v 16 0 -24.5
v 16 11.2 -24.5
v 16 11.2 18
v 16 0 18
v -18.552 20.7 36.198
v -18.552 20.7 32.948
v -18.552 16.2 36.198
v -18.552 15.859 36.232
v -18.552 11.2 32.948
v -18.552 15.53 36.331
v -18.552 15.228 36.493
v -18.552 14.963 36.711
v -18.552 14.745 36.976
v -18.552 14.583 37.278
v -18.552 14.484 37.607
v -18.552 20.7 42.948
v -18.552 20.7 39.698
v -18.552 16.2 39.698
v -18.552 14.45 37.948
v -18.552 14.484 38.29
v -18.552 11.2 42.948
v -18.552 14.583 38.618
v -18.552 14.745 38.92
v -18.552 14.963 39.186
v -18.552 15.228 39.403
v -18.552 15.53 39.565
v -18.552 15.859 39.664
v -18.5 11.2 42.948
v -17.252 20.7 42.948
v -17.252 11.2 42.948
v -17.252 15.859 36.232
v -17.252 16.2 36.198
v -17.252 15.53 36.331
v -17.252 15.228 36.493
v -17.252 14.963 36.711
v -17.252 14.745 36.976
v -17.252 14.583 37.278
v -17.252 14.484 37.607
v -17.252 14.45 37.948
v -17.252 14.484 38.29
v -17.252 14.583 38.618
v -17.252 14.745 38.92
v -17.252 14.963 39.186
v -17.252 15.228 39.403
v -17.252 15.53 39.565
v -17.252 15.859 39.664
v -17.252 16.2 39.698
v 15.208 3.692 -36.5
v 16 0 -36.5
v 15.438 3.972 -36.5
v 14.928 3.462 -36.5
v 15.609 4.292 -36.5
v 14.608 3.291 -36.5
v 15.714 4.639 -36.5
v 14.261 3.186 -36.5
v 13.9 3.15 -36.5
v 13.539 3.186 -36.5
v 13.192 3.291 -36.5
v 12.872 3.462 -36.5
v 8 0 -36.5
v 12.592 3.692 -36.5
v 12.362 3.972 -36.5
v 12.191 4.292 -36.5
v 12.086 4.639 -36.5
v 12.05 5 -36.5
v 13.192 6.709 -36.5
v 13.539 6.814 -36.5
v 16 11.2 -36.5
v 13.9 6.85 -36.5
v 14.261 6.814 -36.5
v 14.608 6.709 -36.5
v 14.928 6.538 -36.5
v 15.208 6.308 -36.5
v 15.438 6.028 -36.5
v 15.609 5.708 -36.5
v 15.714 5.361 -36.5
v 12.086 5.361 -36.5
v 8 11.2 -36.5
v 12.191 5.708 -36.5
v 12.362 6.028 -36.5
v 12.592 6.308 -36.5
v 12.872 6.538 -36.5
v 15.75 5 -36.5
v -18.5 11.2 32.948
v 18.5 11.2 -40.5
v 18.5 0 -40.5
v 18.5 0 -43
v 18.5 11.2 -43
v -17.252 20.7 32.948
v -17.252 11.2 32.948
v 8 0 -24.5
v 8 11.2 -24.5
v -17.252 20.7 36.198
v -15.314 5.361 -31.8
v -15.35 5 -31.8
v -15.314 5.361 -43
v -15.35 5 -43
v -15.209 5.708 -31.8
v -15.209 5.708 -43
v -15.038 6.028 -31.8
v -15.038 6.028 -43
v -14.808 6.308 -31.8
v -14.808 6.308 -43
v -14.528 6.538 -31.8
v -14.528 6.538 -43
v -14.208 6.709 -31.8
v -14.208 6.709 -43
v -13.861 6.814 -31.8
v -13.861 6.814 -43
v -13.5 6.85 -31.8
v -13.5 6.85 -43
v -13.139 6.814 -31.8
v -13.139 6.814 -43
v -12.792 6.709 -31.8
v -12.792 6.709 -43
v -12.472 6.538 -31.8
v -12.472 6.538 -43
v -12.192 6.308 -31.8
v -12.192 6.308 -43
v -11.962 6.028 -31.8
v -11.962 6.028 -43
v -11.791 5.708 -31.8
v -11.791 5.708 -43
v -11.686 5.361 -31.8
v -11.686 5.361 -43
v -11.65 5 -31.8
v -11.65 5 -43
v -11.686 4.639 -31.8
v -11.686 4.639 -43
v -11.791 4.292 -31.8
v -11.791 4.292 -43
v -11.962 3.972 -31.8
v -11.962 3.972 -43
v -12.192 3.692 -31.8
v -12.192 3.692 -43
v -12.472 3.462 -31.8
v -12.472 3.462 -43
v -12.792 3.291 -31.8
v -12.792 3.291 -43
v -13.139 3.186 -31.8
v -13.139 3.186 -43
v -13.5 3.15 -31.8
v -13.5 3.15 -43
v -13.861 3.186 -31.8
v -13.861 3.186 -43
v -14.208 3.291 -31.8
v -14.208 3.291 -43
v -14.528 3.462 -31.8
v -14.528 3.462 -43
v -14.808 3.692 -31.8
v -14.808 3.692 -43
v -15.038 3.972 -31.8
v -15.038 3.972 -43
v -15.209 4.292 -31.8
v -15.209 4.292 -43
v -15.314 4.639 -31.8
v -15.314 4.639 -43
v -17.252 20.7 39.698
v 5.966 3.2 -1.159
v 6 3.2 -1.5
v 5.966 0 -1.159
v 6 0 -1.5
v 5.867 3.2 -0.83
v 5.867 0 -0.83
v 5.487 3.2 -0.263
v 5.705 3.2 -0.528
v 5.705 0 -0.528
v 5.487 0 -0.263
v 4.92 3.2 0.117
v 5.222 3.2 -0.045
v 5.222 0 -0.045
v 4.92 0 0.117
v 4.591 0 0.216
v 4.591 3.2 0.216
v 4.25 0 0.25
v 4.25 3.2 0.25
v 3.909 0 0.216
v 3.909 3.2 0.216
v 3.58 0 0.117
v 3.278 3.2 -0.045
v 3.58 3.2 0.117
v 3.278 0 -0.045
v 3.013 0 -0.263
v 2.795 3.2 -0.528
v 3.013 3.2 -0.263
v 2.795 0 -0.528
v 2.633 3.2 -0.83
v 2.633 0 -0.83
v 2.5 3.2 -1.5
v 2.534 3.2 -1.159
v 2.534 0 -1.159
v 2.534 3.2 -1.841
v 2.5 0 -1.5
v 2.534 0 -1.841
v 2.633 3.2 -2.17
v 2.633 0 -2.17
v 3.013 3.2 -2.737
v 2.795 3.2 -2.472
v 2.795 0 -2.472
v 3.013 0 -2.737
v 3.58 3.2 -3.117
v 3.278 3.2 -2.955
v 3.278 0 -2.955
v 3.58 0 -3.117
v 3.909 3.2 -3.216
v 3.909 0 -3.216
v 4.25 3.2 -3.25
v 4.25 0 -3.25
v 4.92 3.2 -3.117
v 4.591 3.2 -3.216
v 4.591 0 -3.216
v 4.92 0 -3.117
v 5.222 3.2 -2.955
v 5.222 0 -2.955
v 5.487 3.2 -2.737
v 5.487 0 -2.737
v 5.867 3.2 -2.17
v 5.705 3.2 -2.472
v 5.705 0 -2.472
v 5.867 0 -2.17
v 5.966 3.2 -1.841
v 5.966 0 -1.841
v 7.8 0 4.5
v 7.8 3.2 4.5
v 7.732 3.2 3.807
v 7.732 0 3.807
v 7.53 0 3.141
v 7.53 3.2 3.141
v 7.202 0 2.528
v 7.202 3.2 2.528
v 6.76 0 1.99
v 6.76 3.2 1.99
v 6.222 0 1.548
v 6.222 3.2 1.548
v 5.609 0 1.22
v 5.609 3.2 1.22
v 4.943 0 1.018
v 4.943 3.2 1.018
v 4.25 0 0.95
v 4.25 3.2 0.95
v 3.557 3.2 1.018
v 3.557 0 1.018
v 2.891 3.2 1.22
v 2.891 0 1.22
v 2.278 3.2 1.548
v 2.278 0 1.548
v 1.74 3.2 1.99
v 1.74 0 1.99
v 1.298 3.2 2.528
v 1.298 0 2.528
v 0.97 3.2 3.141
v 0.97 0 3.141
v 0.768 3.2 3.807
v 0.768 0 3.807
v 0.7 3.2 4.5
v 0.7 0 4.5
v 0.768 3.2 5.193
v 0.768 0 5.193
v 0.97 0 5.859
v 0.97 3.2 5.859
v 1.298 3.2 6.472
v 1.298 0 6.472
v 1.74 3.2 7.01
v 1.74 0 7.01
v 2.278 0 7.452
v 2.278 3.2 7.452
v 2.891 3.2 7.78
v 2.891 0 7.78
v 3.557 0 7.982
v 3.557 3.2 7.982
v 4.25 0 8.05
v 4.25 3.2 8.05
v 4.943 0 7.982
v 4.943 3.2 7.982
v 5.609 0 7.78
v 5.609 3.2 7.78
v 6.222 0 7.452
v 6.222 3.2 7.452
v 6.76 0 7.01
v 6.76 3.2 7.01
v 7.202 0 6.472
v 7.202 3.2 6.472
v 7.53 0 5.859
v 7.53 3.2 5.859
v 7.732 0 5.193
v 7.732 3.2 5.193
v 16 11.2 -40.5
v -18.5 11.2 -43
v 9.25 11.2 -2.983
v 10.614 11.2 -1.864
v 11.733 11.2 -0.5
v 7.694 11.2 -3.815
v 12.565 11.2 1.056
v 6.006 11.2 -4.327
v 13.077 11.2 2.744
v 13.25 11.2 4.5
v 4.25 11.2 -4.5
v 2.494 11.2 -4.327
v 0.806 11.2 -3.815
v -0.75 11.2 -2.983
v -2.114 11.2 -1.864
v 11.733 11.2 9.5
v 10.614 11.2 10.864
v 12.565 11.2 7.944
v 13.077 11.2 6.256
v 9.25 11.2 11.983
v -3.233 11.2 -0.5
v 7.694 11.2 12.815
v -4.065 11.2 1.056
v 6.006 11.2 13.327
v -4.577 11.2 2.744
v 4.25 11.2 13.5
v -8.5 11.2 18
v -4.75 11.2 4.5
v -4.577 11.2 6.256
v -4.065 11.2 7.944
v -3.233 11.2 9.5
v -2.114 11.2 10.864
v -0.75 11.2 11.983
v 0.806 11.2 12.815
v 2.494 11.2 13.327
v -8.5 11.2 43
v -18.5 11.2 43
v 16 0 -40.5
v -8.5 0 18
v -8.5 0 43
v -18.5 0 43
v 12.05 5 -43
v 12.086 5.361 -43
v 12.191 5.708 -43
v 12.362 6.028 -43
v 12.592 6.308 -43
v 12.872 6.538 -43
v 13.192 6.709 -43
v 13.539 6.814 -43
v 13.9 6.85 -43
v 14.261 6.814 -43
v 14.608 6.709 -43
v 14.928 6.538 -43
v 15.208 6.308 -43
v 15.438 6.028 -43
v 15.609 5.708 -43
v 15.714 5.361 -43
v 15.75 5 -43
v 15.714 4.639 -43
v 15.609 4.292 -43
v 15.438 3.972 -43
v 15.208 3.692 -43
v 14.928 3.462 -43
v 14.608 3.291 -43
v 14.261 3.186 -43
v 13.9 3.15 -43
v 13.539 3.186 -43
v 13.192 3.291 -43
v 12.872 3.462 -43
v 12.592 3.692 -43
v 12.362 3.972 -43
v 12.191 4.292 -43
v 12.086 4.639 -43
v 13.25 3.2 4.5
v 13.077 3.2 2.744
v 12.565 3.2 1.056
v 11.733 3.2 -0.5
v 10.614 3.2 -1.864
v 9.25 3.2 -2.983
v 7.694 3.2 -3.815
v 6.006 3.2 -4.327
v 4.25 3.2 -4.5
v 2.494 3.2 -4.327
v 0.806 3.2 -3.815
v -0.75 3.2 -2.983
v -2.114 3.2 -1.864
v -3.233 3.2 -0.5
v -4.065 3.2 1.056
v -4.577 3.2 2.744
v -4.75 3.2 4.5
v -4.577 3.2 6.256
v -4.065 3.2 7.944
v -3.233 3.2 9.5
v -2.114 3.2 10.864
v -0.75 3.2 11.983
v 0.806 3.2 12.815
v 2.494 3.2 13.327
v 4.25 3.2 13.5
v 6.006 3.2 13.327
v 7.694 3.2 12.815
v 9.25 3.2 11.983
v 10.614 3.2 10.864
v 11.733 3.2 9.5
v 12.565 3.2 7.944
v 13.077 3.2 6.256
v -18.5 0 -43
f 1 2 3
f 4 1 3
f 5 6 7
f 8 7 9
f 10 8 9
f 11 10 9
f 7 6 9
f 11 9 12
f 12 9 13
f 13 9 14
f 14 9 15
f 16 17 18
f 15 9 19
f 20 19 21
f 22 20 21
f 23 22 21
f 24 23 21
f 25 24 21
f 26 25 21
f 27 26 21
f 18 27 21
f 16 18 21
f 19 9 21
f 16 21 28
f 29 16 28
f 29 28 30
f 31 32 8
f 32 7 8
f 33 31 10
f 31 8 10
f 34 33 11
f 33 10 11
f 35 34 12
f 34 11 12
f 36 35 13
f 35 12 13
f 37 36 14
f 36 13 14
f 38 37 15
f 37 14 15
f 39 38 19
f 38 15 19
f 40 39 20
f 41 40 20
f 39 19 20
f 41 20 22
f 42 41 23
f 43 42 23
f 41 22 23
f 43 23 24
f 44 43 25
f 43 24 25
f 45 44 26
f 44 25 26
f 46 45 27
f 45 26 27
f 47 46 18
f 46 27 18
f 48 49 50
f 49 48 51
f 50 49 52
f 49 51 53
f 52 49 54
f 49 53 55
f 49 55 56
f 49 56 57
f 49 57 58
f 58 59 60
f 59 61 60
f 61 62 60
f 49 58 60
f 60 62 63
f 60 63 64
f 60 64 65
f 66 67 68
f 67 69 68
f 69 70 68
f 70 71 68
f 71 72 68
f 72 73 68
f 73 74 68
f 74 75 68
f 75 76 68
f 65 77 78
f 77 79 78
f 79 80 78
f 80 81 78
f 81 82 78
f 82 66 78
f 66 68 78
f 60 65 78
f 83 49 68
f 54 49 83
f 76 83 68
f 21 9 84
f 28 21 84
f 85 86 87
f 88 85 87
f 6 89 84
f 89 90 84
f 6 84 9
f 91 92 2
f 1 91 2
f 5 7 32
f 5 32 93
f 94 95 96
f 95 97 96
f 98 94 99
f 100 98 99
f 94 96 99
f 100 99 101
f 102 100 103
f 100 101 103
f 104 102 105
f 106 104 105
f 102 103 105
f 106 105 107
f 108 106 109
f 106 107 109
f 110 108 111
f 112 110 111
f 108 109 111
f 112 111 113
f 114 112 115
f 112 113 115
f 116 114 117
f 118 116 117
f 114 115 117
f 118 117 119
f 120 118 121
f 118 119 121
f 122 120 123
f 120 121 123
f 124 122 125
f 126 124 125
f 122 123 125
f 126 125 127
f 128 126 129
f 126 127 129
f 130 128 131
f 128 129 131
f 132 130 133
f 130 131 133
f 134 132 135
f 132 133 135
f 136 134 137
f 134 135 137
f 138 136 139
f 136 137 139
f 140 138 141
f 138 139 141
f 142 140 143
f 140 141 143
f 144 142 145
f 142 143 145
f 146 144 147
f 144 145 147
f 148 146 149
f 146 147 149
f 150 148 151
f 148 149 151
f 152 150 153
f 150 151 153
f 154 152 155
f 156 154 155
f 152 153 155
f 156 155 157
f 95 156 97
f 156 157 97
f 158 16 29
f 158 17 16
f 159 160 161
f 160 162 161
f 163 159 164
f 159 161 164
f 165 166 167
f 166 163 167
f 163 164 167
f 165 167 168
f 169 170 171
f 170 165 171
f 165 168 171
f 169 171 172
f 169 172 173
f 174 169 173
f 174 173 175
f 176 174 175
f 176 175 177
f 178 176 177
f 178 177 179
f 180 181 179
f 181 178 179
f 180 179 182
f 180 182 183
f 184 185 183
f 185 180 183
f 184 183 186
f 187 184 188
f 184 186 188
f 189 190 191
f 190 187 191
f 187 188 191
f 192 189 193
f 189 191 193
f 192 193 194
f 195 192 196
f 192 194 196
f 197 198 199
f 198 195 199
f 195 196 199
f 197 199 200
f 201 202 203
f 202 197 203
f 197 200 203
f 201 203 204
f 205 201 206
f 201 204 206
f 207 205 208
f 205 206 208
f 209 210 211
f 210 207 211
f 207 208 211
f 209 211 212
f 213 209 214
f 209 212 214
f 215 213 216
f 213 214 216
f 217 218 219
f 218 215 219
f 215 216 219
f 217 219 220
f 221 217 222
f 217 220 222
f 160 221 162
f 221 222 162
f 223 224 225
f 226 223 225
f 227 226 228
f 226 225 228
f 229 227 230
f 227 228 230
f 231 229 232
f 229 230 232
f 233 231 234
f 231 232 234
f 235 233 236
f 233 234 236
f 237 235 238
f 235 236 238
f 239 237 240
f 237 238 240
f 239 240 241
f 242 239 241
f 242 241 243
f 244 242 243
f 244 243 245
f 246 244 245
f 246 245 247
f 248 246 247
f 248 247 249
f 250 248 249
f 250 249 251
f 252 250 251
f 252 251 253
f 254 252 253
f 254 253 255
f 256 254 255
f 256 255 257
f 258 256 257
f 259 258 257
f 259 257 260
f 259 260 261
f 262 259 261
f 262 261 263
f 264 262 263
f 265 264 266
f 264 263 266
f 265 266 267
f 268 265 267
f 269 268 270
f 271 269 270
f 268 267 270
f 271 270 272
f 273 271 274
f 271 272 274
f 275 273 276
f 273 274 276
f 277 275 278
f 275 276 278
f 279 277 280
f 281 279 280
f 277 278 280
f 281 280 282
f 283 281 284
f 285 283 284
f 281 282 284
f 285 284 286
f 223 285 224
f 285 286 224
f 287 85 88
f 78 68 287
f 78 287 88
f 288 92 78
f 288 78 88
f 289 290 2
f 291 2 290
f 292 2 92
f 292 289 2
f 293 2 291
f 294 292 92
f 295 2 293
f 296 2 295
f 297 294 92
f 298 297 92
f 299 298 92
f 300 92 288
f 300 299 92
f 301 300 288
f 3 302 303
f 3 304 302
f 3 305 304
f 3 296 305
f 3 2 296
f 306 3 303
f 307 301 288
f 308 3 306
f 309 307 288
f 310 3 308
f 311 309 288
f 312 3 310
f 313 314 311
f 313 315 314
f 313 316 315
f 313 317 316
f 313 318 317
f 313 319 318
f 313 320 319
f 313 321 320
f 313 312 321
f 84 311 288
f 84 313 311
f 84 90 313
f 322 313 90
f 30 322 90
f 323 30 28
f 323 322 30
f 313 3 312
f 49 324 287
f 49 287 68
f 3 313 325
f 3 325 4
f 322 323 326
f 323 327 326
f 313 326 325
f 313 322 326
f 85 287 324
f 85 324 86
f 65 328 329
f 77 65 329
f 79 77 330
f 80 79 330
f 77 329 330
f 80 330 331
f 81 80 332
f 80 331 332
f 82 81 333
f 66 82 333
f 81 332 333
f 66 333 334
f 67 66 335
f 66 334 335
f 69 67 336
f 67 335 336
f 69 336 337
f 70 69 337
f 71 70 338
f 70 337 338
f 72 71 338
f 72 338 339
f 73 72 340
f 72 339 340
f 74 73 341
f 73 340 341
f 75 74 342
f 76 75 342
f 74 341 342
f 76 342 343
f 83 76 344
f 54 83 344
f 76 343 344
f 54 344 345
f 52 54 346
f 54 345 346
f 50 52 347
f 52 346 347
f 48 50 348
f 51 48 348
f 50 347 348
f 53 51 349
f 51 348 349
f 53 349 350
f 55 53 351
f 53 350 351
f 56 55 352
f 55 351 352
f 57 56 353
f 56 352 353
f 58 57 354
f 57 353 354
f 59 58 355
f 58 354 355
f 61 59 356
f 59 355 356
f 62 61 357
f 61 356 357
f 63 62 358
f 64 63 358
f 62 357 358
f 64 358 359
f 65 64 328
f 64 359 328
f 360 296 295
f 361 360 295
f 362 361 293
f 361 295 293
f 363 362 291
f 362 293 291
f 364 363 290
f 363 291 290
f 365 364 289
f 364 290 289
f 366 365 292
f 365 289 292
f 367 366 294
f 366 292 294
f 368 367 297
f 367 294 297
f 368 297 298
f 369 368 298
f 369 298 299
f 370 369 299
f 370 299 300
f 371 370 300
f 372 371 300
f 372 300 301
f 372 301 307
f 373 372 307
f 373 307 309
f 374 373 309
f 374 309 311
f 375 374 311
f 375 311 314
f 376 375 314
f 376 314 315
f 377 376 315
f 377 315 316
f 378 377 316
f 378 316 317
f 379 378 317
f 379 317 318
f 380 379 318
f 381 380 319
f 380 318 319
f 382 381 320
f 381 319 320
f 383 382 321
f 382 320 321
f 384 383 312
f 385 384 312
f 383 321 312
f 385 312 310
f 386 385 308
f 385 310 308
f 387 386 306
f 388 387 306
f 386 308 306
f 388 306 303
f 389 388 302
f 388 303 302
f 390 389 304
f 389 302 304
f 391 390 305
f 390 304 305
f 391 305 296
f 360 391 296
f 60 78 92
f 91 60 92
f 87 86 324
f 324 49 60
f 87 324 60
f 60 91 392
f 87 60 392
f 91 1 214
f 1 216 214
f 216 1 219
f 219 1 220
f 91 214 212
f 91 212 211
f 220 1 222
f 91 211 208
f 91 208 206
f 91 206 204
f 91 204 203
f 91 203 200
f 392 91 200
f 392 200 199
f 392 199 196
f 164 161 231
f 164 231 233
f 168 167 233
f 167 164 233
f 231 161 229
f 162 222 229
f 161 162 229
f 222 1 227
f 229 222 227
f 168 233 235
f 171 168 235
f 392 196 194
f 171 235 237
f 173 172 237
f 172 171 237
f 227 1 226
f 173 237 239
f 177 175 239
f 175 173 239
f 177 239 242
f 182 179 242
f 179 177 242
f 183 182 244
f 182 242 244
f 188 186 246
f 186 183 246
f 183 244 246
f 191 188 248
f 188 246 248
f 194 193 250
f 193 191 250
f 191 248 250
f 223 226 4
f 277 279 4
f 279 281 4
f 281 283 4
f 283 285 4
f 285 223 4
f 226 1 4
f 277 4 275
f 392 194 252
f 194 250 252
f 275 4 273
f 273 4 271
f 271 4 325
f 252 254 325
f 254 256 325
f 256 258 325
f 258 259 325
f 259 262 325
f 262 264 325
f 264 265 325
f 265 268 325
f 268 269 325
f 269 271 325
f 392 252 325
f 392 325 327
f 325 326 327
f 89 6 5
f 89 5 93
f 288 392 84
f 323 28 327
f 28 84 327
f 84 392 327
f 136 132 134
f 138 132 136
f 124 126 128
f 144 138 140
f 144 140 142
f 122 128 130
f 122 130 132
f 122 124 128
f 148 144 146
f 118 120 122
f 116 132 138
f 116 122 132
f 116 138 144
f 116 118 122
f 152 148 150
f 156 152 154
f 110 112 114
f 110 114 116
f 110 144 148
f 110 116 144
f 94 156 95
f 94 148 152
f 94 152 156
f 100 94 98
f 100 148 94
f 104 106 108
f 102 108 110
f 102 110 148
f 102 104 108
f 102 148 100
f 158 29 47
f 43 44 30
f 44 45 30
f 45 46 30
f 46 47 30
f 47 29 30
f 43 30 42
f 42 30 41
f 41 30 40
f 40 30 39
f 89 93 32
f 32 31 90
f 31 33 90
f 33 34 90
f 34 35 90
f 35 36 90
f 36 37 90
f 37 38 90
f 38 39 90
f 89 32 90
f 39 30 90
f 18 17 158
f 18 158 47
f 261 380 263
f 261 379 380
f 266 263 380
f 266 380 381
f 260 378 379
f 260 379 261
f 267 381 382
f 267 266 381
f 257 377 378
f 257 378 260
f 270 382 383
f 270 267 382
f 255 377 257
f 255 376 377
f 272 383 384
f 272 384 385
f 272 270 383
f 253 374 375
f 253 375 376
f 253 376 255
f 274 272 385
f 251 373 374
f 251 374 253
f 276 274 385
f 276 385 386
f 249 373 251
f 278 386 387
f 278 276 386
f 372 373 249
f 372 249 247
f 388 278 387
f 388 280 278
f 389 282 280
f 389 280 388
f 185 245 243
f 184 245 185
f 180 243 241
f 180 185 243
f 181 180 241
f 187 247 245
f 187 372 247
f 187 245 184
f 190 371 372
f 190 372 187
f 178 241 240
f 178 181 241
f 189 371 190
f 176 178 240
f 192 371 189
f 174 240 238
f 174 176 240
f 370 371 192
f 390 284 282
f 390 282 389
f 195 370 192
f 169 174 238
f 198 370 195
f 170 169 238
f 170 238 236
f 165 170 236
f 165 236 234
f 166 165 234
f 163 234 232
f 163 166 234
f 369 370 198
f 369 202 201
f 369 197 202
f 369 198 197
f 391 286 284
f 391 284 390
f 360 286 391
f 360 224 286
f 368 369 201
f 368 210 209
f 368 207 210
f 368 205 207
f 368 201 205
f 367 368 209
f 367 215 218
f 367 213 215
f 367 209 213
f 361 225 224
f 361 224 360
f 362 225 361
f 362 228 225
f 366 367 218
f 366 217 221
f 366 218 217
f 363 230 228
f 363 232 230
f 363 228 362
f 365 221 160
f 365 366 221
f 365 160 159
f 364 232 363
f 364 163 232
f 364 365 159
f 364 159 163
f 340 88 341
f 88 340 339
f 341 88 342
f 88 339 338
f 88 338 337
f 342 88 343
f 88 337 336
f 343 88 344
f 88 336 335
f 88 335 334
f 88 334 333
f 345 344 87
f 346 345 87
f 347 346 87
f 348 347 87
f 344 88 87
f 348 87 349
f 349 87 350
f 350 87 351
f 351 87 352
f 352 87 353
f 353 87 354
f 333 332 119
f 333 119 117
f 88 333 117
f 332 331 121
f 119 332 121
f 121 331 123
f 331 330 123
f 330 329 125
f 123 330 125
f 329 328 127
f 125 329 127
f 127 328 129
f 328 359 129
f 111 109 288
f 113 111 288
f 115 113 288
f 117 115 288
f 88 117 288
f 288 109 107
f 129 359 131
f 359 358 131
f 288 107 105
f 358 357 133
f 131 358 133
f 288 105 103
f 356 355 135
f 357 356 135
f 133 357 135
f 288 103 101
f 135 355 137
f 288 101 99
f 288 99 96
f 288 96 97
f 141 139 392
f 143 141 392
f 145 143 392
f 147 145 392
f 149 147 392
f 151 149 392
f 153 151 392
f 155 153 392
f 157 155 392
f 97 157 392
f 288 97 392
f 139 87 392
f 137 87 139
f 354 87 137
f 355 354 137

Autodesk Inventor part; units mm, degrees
ref_plane "YZ Plane" through (0, 0, 0) normal (1, 0, 0) x (0, 1, 0)
ref_plane "XZ Plane" through (0, 0, 0) normal (0, 1, 0) x (-1, 0, 0)
ref_plane "XY Plane" through (0, 0, 0) normal (0, 0, 1) x (1, 0, 0)
sketch "Sketch1" plane through (0, 0, 0) normal (0, 1, 0) x (-1, 0, 0)
  line L0 (18.5, 43) -> (-18.5, 43)
  line L1 (-18.5, 43) -> (-18.5, -43)
  line L2 (-18.5, -43) -> (18.5, -43)
  line L3 (18.5, -43) -> (18.5, 43)
  line L4 (18.5, 43) -> (-18.5, -43) construction
  line L5 (-18.5, 43) -> (18.5, -43) construction
  point P0 (0, 0)
  dimension "d0" = 37
  dimension "d1" = 86
extrude "Body" add sketch "Sketch1" along normal blind 11.2
sketch "Sketch2" plane through (18.5, 0, -43) normal (0, 0, -1) x (-1, 0, 0)
  circle A0 centre (32, 5) radius 1.85
  line L0 (37, 0) -> (37, 11.2) projected
  line L1 (0, 0) -> (37, 0) projected
  circle A1 centre (4.6, 5) radius 1.85
  line L2 (0, 0) -> (0, 11.2) projected
  point P0 (18.5, 0)
  dimension "d4" = 3.7
  dimension "d5" = 5
  dimension "d6" = 5
  dimension "d7" = 3.7
  dimension "d8" = 5
  dimension "d9" = 4.6
extrude "Side Mounts" cut sketch "Sketch2" against normal blind 11.2
sketch "Sketch3" plane through (0, 11.2, 0) normal (0, 1, 0) x (1, 0, 0)
  line L0 (-18.5, -43) -> (18.5, -43) projected
  line L1 (18.5, 43) -> (16, 43)
  line L2 (16, 43) -> (16, -43)
  line L3 (16, -43) -> (18.5, -43)
  line L4 (18.5, -43) -> (18.5, 43)
  line L5 (16, 40.5) -> (18.5, 40.5)
  point P0 (0, 0)
  point P1 (17.25, 43)
  point P2 (17.25, 40.5)
  dimension "d12" = 2.5
  dimension "d13" = 2.5
extrude "mains cutout" cut sketch "Sketch3" against normal up to surface (11.2 mm away) contours L2 L5 L4 L0
sketch "Sketch4" plane through (0, 11.2, 0) normal (0, 1, 0) x (1, 0, 0)
  line L0 (16, 40.5) -> (16, -43) projected
  line L1 (-18.5, -43) -> (-8.5, -43)
  line L2 (-8.5, -43) -> (-8.5, -18)
  line L3 (-8.5, -18) -> (16, -18)
  line L4 (16, -43) -> (-8.5, -43)
  point P0 (0, 0)
  dimension "d19" = 25
extrude "screen cut out" cut sketch "Sketch4" against normal up to surface (11.2 mm away)
sketch "Sketch5" plane through (0, 11.2, 0) normal (0, 1, 0) x (1, 0, 0)
  line L0 (-18.5524, -42.9481) -> (-17.2524, -42.9481)
  line L1 (-17.2524, -42.9481) -> (-17.2524, -32.9481)
  line L2 (-17.2524, -32.9481) -> (-18.5524, -32.9481)
  line L3 (-18.5524, -32.9481) -> (-18.5524, -42.9481)
  point P0 (0, 0)
  dimension "d22" = 1.3
  dimension "d23" = 10
extrude "top mount bracket" add sketch "Sketch5" along normal blind 9.5
sketch "Sketch6" plane through (-18.5524, 11.2, 32.9481) normal (-1, 0, 0) x (0, 0, 1)
  circle A0 centre (5, 5) radius 1.75
  line L0 (0, 9.5) -> (10, 9.5) projected
  line L1 (0, 0) -> (0, 9.5) projected
  line L2 (3.25, 5) -> (3.25, 9.5)
  line L3 (6.75, 9.5) -> (6.75, 5)
  point P0 (-32.9481, -11.2)
  dimension "d26" = 3.5
  dimension "d27" = 4.5
  dimension "d28" = 5
extrude "top mount hole" cut sketch "Sketch6" against normal up to surface (1.3 mm away)
sketch "Sketch7" plane through (0, 11.2, 0) normal (0, 1, 0) x (1, 0, 0)
  circle A0 centre (4.25, -4.5) radius 3.55
  line L0 (-18.5, 43) -> (-18.5, -32.9481) projected
  line L1 (-18.5, -43) -> (-8.5, -43) projected
  point P0 (0, 0)
  dimension "d32" = 7.1
  dimension "d33" = 22.75
  dimension "d34" = 38.5
extrude "Pot hole" cut sketch "Sketch7" against normal up to surface (11.2 mm away)
sketch "Sketch8" plane through (0, 11.2, 0) normal (0, 1, 0) x (1, 0, 0)
  circle A0 centre (4.25, -4.5) radius 9
  point P0 (0, 0)
  dimension "d37" = 18
extrude "Extrusion8" cut sketch "Sketch8" against normal blind 8
sketch "Sketch9" plane through (0, 11.2, 0) normal (0, 1, 0) x (1, 0, 0)
  line L0 (16, -18) -> (16, 40.5) projected
  line L1 (16, 40.5) -> (16, 28.5)
  line L2 (16, 40.5) -> (16, 36.5)
  line L3 (16, 36.5) -> (8, 36.5)
  line L4 (8, 36.5) -> (8, 24.5)
  line L5 (8, 24.5) -> (16, 24.5)
  line L6 (16, 24.5) -> (16, 36.5)
  point P0 (0, 0)
  dimension "d42" = 4
  dimension "d43" = 8
  dimension "d44" = 12
extrude "Extrusion9" cut sketch "Sketch9" against normal up to surface (11.2 mm away)
sketch "Sketch10" plane through (0, 11.2, 0) normal (0, 1, 0) x (1, 0, 0)
  line L0 (16, 36.5) -> (16, 40.5) projected
  line L1 (-17.2524, -32.9481) -> (-17.2524, -42.9481) projected
  line L2 (16, 36.5) -> (-17.2524, 36.5)
  line L3 (-17.2524, 36.5) -> (-17.2524, -42.9481)
  line L4 (-17.2524, -42.9481) -> (16, -42.9481)
  line L5 (16, -42.9481) -> (16, 36.5)
  point P0 (0, 0)
sketch "encoder locator" plane through (0, 0, 0) normal (0, -1, 0) x (1, 0, 0)
  line L0 (4.25, 4.5) -> (4.25, -1.5)
  circle A0 centre (4.25, -1.5) radius 1.75
  point P0 (0, 0)
  dimension "d49" = 6
  dimension "d50" = 3.5
extrude "Extrusion11" cut sketch "encoder locator" against normal up to surface (3.2 mm away)
equation "\"d8\" = d6"
properties part number "Knob Bracket v4_3DPrint"
